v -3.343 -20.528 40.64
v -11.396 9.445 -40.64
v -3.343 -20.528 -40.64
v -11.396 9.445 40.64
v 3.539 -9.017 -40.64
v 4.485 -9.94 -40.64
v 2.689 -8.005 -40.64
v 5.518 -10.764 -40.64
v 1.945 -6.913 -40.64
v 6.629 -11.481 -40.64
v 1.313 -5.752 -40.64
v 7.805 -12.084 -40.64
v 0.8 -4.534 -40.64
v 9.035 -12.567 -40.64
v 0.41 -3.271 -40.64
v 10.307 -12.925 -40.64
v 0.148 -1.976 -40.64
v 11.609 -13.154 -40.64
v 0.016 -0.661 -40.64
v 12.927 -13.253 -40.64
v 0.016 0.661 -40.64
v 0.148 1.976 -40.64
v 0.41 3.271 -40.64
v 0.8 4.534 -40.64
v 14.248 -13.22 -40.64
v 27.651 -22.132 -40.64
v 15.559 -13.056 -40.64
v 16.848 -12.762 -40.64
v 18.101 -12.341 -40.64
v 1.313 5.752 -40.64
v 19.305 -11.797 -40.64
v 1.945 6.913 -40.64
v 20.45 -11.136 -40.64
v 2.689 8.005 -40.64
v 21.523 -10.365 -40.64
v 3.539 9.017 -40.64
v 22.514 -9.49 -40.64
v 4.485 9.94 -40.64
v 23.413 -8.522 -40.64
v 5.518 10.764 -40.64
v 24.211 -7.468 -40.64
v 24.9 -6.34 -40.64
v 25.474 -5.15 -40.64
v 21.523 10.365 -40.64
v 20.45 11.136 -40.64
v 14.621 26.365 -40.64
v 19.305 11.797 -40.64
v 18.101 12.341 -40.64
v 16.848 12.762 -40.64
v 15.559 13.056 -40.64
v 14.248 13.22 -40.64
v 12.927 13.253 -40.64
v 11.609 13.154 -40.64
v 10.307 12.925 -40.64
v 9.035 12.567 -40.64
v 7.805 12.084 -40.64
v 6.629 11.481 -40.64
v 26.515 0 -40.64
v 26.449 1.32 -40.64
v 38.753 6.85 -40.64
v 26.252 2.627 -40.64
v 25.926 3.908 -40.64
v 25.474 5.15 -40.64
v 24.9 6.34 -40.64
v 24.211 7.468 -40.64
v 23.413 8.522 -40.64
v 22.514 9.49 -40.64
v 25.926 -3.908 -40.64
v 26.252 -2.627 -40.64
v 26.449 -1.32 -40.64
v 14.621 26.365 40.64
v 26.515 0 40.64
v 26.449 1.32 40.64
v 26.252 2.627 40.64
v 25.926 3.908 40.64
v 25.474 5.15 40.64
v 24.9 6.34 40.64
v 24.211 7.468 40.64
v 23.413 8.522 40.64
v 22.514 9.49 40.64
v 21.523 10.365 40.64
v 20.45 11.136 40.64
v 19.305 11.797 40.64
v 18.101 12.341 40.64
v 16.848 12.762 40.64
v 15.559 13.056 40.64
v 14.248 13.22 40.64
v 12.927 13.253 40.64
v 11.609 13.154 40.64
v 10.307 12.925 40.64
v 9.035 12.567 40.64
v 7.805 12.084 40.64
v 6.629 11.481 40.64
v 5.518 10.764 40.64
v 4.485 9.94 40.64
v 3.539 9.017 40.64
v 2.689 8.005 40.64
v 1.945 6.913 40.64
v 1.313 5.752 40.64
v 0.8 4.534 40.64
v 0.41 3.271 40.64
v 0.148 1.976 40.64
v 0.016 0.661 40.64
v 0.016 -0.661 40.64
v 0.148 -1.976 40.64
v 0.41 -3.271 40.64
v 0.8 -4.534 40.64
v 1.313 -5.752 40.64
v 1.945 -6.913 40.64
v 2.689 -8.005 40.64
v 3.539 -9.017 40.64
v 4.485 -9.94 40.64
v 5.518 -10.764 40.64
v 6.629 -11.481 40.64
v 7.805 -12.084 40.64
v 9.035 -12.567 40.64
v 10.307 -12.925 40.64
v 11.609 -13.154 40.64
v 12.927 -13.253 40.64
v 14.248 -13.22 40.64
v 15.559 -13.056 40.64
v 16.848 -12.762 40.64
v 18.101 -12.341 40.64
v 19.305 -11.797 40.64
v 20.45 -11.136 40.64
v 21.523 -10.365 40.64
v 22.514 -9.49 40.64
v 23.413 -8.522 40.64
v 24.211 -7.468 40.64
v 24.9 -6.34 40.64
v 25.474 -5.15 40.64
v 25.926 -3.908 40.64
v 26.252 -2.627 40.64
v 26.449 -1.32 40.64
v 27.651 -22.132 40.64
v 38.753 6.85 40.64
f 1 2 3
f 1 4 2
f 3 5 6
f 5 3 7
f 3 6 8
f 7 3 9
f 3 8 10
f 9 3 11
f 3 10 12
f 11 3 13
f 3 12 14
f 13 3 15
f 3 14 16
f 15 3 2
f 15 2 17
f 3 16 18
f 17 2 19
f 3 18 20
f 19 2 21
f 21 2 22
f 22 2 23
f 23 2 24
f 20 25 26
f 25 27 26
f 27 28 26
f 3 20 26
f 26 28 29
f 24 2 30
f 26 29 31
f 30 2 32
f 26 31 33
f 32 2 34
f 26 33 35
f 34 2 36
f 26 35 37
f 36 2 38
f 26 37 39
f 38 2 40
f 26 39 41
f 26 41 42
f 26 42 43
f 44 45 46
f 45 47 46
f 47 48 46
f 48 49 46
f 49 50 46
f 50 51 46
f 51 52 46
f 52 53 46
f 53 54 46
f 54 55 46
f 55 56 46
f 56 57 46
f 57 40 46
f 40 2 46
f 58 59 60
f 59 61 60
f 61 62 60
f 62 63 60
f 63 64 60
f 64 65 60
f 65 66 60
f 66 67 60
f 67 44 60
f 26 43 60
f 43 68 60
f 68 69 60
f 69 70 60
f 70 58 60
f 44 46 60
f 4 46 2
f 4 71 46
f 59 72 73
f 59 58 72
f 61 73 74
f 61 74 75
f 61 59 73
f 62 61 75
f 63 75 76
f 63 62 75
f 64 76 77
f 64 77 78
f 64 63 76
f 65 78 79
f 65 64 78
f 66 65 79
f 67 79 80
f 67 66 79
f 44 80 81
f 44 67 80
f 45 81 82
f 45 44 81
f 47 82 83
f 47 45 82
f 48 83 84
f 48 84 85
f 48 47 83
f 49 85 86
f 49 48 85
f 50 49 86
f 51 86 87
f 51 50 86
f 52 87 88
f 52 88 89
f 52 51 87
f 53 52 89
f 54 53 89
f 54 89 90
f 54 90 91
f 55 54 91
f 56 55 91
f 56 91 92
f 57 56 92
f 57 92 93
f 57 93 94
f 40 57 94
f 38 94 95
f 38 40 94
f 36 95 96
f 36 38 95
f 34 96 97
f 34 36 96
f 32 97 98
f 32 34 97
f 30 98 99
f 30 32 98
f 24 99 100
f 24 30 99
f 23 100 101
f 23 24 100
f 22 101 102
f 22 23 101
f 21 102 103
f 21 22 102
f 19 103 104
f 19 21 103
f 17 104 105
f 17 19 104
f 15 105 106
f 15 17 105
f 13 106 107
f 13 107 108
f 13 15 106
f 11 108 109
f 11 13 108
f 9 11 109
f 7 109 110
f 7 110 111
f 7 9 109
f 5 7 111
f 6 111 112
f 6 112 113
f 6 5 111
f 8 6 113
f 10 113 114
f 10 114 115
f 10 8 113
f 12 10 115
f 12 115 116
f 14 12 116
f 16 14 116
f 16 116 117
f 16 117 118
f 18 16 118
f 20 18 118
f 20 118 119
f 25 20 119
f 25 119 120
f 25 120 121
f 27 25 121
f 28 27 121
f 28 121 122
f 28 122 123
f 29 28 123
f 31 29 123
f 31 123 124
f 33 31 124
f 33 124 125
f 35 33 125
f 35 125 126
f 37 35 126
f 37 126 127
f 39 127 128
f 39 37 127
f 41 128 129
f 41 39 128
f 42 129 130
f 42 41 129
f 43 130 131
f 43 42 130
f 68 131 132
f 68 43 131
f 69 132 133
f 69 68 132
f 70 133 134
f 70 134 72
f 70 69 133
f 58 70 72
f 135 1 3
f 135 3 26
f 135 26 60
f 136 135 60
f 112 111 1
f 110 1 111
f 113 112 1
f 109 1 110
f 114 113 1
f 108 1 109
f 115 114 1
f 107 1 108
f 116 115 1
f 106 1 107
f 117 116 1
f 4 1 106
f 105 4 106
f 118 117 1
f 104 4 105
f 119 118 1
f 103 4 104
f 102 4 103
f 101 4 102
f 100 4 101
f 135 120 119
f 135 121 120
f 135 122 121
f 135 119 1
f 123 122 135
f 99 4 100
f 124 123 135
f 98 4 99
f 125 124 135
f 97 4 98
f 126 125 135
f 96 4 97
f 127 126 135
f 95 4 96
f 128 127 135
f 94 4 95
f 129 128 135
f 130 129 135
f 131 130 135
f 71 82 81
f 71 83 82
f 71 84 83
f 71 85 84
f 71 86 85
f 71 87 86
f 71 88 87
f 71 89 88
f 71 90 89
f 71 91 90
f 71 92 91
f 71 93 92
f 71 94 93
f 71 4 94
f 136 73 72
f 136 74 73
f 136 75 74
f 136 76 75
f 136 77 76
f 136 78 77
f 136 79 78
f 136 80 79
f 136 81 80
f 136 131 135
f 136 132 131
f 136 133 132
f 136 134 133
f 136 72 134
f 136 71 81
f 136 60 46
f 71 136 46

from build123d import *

# Parameters (mm, degrees)
F4_R     = 13.2572976872
F5_DEPTH = 40.64


# Not quite as in the source:
# - the program builds the solid bodies; features that only make, move or delete a surface that nothing else refers to are left out


with BuildPart() as f5:
    # F4 (on Top) → F5 (new body, symmetric)
    with BuildSketch(Plane.XY):
        Polygon((-11.3957837711, 9.4445306856), (-3.343205899, -20.527953282), (27.650703699, -22.1315035333), (38.7534154026, 6.8499318763), (14.6213590048, 26.3649942535), align=None)
        with Locations((13.2572976872, 0)):
            Circle(F4_R, mode=Mode.SUBTRACT)
    extrude(amount=F5_DEPTH, both=True)


solid = f5.part
